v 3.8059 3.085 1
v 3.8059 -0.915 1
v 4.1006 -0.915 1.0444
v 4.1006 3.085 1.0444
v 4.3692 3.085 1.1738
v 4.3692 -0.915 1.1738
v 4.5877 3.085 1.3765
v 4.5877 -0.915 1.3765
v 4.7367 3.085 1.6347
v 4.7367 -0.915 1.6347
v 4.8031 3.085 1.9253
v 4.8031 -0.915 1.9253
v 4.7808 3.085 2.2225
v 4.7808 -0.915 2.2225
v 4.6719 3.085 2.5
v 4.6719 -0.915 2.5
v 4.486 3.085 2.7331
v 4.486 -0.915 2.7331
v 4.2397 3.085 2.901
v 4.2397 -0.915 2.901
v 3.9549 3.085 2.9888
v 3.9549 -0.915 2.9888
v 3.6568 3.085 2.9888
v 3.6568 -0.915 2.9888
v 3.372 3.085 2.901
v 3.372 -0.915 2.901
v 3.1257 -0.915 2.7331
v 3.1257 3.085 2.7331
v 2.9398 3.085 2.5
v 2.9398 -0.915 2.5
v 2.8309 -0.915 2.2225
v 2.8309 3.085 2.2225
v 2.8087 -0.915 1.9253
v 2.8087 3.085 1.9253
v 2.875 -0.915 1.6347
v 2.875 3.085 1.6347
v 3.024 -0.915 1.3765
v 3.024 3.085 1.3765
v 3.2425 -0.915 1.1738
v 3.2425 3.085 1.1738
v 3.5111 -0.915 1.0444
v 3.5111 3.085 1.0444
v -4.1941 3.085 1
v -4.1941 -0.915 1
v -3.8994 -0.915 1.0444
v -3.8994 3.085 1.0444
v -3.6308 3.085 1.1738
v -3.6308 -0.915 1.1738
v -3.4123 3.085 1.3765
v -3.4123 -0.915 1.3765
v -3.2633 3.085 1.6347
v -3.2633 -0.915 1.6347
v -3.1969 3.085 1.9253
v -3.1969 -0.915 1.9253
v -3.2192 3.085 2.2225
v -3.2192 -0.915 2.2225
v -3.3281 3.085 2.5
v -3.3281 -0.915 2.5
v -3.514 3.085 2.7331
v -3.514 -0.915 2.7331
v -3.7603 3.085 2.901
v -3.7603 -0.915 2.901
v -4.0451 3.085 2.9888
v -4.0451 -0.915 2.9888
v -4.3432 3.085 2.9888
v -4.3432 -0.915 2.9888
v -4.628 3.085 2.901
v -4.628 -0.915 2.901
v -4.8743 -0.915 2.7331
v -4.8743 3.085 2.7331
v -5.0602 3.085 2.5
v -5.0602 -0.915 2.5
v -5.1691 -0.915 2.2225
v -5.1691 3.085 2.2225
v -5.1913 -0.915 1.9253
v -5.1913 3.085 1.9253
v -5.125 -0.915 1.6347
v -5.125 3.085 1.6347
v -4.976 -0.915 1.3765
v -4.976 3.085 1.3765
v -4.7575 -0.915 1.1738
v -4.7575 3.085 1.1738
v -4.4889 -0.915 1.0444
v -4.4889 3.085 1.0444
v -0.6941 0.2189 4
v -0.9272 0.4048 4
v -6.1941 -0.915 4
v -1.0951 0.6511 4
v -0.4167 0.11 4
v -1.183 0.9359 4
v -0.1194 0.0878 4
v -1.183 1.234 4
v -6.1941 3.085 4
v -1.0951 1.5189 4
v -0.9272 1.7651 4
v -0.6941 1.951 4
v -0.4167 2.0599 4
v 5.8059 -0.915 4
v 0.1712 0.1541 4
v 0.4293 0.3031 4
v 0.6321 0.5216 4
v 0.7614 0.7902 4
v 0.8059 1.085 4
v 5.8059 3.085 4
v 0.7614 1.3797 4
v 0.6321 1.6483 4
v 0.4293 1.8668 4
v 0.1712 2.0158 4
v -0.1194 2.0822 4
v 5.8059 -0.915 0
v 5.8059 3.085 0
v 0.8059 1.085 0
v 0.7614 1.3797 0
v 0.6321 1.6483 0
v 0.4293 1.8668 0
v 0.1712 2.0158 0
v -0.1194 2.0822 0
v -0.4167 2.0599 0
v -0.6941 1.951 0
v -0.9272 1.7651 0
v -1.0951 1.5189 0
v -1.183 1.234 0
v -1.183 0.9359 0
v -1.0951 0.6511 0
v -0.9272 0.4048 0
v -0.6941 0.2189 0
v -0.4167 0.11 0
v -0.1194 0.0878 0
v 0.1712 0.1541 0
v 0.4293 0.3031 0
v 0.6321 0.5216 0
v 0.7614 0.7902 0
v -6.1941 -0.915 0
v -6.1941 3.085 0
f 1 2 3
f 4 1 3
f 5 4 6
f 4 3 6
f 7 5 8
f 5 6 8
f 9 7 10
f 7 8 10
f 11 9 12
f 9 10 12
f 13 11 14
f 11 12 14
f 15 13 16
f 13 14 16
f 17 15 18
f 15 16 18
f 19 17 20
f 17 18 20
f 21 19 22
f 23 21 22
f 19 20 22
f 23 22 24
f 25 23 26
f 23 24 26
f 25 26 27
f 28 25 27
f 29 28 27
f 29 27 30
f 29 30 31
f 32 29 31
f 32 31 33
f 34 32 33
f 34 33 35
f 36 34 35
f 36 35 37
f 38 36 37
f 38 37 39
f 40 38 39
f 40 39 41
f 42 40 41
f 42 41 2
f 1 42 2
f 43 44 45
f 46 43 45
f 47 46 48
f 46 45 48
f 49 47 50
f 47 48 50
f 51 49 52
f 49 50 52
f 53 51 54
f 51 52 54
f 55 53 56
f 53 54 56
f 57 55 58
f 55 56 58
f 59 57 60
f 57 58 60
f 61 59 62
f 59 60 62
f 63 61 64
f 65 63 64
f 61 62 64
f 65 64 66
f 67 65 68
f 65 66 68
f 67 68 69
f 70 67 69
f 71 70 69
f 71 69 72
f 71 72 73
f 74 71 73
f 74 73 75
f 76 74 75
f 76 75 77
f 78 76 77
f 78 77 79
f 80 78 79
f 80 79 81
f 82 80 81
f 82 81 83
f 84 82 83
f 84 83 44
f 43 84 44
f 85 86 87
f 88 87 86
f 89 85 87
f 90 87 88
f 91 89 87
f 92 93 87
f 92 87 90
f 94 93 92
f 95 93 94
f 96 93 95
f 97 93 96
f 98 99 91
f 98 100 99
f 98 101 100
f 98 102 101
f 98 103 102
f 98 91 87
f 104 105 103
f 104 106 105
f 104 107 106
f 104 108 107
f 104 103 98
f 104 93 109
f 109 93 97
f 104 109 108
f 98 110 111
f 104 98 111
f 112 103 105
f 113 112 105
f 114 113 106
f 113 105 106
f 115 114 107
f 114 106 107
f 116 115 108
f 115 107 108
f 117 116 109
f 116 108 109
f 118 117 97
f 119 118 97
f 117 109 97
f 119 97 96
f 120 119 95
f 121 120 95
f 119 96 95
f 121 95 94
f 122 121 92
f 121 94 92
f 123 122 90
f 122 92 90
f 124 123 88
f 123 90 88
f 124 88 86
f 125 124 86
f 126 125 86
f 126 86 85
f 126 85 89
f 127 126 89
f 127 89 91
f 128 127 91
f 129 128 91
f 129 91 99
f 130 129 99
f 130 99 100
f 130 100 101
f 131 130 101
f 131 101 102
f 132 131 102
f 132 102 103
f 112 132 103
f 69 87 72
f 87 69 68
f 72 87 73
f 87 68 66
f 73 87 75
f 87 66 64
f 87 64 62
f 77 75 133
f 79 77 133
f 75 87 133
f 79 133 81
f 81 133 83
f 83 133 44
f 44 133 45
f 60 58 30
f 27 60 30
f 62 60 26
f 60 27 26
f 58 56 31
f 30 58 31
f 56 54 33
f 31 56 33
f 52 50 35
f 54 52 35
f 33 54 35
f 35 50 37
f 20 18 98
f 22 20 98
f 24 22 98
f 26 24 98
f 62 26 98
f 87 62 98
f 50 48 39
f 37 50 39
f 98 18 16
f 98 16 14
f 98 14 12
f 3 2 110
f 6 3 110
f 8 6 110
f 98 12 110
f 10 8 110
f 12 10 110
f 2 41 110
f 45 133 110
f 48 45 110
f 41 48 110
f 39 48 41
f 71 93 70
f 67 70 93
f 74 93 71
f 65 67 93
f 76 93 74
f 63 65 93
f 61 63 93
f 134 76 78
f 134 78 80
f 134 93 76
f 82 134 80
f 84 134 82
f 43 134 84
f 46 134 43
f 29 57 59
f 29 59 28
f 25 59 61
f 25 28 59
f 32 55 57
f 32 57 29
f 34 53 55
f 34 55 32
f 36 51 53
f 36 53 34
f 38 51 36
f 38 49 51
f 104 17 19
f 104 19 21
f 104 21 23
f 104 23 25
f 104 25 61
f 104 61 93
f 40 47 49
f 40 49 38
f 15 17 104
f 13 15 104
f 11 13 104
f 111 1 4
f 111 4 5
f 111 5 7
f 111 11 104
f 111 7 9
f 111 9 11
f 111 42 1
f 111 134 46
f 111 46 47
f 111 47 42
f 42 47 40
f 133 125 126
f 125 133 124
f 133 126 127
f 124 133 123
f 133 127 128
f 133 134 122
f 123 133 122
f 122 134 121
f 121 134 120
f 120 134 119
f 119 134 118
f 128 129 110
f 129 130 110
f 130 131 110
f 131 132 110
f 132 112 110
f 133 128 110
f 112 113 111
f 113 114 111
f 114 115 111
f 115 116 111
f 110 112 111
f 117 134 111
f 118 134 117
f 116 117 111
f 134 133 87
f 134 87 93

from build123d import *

# Parameters (mm, degrees)
SKETCH_1_W          = 12
SKETCH_1_H          = 4
EXTRUDE_1_DEPTH     = 4
SKETCH_2_R          = 1
CUT_EXTRUDE_1_DEPTH = 11
SKETCH_3_R          = 1
CUT_EXTRUDE_2_DEPTH = 11


with BuildPart() as part:
    # 草圖1 → 填料-伸長1 (new body)
    with BuildSketch(Plane.XY):
        with Locations((-0.194141854, 1.08496732)):
            Rectangle(SKETCH_1_W, SKETCH_1_H)
    extrude(amount=EXTRUDE_1_DEPTH)

    # 草圖2 → 除料-伸長1 (cut)
    with BuildSketch(Plane.XZ.offset(0.91503268)):
        with Locations(Location((-4.194141854, 2, 0), (0, 0, 270))):
            Circle(SKETCH_2_R)
        with Locations(Location((3.805858146, 2, 0), (0, 0, 270))):
            Circle(SKETCH_2_R)
    extrude(amount=-CUT_EXTRUDE_1_DEPTH, mode=Mode.SUBTRACT)

    # 草圖3 → 除料-伸長2 (cut)
    with BuildSketch(Plane.XY.offset(4)):
        with Locations((-0.194141854, 1.08496732)):
            Circle(SKETCH_3_R)
    extrude(amount=-CUT_EXTRUDE_2_DEPTH, mode=Mode.SUBTRACT)


solid = part.part
